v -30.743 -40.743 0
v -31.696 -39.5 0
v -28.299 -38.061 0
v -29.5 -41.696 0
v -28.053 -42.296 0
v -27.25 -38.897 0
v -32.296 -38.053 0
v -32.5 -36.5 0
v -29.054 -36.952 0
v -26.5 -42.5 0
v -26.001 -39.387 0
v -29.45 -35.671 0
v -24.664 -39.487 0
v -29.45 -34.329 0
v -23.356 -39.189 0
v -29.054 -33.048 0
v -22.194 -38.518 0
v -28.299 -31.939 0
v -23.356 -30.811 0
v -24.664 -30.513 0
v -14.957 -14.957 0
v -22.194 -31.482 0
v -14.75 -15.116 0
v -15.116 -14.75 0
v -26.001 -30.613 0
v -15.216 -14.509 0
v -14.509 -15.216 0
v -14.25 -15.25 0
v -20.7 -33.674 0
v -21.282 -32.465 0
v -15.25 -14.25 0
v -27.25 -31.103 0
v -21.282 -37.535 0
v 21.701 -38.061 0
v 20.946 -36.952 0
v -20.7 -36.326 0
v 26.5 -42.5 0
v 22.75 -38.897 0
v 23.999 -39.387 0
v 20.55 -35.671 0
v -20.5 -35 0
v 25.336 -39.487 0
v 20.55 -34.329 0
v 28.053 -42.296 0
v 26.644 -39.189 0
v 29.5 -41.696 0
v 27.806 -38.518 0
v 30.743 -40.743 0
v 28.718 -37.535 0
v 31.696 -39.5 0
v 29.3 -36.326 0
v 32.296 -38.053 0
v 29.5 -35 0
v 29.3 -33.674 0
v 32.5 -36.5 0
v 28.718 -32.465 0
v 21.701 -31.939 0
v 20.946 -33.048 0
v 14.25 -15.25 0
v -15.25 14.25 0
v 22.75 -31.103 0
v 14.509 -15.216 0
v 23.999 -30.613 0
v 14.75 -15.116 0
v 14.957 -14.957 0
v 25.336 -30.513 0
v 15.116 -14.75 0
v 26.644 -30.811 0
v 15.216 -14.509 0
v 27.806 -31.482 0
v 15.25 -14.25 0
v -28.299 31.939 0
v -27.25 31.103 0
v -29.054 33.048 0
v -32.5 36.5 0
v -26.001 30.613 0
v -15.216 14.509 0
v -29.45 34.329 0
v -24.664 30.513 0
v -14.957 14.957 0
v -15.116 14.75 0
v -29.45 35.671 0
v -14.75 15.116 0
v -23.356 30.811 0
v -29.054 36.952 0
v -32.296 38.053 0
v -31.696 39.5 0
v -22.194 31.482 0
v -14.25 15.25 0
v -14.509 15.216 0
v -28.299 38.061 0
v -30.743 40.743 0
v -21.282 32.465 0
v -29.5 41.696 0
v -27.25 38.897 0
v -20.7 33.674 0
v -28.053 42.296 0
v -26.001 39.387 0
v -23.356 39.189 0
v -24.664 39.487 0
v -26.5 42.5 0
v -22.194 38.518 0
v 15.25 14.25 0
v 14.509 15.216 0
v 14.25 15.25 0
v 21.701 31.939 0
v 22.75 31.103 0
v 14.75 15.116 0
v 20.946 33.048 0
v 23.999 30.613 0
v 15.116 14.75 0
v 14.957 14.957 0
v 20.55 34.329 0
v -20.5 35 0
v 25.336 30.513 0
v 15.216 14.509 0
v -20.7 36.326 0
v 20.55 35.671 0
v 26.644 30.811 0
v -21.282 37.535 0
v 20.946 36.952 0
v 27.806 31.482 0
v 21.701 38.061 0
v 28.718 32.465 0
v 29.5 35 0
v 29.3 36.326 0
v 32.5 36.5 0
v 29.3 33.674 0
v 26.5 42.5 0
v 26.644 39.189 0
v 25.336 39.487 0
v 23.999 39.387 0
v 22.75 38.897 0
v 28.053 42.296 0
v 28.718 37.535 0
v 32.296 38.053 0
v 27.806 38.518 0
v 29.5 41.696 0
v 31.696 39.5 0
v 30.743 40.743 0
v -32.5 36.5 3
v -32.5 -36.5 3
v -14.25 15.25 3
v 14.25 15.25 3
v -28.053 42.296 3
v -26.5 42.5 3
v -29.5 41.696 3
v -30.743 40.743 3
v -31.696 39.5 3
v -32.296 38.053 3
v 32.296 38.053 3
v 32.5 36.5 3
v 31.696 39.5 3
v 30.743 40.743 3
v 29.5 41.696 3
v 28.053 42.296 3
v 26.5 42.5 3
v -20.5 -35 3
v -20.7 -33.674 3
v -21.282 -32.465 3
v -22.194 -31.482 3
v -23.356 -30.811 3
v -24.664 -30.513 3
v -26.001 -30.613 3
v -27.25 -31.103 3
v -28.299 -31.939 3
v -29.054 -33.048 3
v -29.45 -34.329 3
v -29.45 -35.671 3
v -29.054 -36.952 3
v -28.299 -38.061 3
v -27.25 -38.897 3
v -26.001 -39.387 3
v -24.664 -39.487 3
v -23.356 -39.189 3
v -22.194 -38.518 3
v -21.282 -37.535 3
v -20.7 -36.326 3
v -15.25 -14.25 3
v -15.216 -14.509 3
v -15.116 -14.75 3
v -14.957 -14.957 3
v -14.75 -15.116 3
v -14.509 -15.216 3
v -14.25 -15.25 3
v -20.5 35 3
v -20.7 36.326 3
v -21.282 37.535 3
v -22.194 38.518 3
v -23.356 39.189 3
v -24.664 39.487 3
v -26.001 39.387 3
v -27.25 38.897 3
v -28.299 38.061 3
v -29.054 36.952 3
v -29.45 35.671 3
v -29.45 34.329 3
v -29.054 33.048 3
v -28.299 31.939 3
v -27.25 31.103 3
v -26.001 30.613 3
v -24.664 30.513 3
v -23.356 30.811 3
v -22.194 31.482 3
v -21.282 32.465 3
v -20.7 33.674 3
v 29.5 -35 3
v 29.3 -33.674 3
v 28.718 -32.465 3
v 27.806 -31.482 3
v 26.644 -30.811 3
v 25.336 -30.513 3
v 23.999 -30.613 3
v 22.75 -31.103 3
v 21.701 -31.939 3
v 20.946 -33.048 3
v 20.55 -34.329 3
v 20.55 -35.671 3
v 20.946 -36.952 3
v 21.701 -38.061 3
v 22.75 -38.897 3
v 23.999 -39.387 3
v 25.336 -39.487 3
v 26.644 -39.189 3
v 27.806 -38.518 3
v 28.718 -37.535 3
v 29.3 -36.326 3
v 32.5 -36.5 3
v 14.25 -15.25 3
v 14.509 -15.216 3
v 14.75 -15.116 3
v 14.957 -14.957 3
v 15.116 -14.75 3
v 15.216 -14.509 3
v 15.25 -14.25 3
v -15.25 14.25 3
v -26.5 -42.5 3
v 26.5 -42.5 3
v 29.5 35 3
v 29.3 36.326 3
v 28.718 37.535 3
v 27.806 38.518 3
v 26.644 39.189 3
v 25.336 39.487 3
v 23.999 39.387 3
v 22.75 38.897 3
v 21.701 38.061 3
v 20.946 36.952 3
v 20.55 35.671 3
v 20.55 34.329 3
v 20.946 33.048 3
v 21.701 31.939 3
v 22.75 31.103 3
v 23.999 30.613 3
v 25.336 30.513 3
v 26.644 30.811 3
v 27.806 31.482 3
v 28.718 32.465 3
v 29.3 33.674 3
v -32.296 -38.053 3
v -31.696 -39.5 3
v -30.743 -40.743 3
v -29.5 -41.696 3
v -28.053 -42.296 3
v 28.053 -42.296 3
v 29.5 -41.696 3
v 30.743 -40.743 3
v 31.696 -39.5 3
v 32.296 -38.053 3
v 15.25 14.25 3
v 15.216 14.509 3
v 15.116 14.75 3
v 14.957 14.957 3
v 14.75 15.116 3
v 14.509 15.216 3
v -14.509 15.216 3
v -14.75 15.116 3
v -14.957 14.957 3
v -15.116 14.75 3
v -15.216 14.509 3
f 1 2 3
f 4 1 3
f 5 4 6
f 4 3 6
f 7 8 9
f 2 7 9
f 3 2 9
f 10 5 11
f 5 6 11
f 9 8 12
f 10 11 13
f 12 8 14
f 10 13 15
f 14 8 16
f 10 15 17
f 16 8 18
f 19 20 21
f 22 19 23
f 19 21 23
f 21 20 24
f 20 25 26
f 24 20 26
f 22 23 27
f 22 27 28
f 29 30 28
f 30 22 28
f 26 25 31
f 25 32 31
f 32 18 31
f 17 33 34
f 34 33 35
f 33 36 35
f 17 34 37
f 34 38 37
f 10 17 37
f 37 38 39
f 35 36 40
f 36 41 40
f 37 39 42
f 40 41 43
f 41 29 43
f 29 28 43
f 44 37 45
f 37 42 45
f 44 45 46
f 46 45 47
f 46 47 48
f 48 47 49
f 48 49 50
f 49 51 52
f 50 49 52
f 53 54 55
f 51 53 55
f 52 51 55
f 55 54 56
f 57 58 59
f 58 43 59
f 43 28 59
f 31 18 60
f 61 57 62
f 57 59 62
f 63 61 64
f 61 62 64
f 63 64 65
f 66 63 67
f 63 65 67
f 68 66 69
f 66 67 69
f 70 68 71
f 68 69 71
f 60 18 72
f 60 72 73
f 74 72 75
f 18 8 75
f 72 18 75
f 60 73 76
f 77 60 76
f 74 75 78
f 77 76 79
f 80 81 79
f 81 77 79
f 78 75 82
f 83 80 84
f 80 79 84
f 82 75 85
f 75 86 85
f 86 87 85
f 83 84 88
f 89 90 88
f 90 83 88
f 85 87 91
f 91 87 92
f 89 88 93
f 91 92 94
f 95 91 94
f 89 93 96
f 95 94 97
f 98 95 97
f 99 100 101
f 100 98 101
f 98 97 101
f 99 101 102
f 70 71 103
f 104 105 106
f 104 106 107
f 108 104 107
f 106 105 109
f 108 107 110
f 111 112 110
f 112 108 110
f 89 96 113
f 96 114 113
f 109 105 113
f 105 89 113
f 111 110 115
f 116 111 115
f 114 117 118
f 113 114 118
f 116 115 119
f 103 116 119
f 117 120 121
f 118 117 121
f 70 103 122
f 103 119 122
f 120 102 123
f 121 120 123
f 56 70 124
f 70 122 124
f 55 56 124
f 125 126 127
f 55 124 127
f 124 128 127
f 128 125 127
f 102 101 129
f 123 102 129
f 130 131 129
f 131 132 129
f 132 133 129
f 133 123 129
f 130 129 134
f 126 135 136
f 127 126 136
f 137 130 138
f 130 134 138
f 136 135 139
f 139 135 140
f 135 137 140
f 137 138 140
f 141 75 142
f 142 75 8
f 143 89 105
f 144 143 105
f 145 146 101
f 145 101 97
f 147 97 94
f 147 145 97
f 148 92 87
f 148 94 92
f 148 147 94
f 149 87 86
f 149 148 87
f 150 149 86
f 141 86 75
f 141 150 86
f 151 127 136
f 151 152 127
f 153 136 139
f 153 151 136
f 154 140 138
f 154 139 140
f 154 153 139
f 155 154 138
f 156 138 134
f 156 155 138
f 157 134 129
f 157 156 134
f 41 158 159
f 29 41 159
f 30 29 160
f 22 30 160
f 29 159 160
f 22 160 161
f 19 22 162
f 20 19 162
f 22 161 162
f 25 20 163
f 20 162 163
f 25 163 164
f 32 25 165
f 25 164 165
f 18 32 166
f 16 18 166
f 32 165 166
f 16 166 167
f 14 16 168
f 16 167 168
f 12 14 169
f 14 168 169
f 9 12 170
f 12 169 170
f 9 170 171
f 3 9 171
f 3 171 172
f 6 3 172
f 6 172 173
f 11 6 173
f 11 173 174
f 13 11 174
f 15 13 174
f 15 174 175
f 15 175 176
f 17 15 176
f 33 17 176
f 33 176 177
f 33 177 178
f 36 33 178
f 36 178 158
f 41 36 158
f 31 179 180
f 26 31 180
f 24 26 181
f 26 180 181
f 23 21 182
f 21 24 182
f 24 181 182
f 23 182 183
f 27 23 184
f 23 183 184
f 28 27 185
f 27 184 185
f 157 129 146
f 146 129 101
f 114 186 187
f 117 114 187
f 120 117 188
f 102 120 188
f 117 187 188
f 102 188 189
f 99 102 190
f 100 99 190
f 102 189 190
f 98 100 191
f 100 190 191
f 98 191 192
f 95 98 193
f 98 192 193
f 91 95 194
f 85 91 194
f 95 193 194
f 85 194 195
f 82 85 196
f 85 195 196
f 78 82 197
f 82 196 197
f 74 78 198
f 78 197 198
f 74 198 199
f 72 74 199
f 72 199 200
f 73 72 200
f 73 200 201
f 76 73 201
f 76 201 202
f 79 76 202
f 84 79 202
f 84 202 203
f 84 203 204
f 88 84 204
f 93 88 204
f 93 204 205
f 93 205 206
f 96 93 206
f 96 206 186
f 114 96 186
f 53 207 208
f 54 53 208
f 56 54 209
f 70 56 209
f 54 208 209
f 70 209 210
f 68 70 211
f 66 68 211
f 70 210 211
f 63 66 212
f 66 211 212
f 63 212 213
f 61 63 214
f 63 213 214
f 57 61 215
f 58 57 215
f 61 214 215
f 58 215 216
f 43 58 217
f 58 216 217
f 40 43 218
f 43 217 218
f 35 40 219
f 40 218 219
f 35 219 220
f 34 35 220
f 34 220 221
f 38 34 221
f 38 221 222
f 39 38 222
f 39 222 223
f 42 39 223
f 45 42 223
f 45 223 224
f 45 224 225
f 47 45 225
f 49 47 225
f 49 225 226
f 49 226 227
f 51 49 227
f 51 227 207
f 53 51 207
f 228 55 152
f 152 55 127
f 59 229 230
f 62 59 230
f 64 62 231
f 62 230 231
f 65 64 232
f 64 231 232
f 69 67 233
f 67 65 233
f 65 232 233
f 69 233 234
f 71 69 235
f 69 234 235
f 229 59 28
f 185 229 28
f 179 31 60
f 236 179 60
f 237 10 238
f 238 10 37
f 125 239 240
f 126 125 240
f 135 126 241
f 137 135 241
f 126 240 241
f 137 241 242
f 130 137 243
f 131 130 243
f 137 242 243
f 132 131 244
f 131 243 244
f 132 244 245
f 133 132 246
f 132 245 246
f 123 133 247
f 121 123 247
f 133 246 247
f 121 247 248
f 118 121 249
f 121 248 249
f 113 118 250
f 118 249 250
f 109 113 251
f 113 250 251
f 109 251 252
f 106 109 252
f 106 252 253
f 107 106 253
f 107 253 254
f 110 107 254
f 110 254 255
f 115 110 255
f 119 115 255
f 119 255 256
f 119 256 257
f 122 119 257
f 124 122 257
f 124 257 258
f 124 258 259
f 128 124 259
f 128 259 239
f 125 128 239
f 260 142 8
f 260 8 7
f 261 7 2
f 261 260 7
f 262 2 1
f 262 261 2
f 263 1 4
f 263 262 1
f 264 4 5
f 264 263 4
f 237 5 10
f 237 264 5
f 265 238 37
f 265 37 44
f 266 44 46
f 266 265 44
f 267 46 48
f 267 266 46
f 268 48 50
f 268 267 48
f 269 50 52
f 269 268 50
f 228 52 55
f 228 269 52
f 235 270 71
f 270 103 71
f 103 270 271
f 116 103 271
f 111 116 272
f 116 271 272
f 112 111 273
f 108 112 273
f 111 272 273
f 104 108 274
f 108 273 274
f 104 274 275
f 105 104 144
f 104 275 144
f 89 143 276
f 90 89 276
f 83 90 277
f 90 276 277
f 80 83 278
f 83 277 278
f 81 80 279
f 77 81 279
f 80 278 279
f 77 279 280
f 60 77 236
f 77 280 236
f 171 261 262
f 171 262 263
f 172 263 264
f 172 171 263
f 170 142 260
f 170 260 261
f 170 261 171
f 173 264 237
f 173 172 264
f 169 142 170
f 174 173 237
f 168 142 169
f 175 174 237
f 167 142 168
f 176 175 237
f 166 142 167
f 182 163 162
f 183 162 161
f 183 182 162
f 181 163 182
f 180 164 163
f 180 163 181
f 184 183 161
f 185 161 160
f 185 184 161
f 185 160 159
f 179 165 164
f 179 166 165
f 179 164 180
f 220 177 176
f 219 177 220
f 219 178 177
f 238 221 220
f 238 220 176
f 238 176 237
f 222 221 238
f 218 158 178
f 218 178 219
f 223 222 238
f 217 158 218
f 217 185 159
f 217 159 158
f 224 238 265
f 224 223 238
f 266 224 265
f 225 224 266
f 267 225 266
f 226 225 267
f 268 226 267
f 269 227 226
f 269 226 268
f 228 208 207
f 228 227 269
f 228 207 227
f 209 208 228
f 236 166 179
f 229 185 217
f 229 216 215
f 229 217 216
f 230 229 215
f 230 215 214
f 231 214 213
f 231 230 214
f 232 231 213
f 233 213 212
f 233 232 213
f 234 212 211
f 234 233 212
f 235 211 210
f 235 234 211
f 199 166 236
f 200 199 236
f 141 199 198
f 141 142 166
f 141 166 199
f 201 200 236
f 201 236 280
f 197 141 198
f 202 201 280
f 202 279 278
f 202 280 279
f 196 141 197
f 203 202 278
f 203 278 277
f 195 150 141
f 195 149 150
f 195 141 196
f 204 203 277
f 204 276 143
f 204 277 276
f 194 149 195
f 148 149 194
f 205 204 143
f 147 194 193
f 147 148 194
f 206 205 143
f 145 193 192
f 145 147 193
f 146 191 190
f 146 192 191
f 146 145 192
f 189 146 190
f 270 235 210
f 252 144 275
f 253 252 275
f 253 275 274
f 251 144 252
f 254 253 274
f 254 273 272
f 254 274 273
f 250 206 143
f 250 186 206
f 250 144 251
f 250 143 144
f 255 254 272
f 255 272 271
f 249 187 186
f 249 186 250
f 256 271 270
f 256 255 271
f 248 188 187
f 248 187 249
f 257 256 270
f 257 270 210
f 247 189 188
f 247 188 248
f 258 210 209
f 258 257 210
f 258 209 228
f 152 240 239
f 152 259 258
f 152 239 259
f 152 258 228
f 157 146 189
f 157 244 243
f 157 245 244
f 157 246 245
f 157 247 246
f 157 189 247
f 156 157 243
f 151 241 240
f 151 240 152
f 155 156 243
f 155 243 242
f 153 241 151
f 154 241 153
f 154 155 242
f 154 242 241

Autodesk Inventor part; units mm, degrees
ref_plane "YZ Plane" through (0, 0, 0) normal (1, 0, 0) x (0, 1, 0)
ref_plane "XZ Plane" through (0, 0, 0) normal (0, 1, 0) x (-1, 0, 0)
ref_plane "XY Plane" through (0, 0, 0) normal (0, 0, 1) x (1, 0, 0)
sketch "Sketch1" plane through (0, 0, 0) normal (0, 0, 1) x (1, 0, 0)
  line L0 (-32.5, -42.5) -> (32.5, -42.5)
  line L1 (32.5, -42.5) -> (32.5, 42.5)
  line L2 (32.5, 42.5) -> (-32.5, 42.5)
  line L3 (-32.5, 42.5) -> (-32.5, -42.5)
  line L4 (-32.5, -42.5) -> (32.5, 42.5) construction
  line L5 (32.5, -42.5) -> (-32.5, 42.5) construction
  line L6 (15.25, -15.25) -> (-15.25, -15.25)
  line L7 (-15.25, -15.25) -> (-15.25, 15.25)
  line L8 (-15.25, 15.25) -> (15.25, 15.25)
  line L9 (15.25, 15.25) -> (15.25, -15.25)
  line L10 (15.25, -15.25) -> (-15.25, 15.25) construction
  line L11 (-15.25, -15.25) -> (15.25, 15.25) construction
  point P0 (0, 0)
  dimension "d154" = 65
  dimension "d155" = 85
  dimension "d172" = 30.5
extrude "Plate5" add sketch "Sketch1" along normal blind 3
sketch "Sketch9" plane through (0, 0, 3) normal (0, 0, 1) x (1, 0, 0)
  circle A0 centre (25, -35) radius 4.5
  line L0 (25, 35) -> (-25, 35) construction
  line L1 (-25, 35) -> (-25, -35) construction
  line L2 (-25, -35) -> (25, -35) construction
  line L3 (25, -35) -> (25, 35) construction
  line L4 (25, 35) -> (-25, -35) construction
  line L5 (-25, 35) -> (25, -35) construction
  circle A1 centre (-25, -35) radius 4.5
  circle A2 centre (25, 35) radius 4.5
  circle A3 centre (-25, 35) radius 4.5
  point P0 (0, 0)
  dimension "d173" = 70
  dimension "d174" = 9
  dimension "d175" = 50
extrude "Cut2" cut sketch "Sketch9" against normal blind 3
fillet "Corner Round1" radius 6 4 edges at (32.5, 42.5, 1.5) (-32.5, 42.5, 1.5) (-32.5, -42.5, 1.5) (32.5, -42.5, 1.5)
fillet "Corner Round2" radius 1 4 edges at (-15.25, 15.25, 1.5) (-15.25, -15.25, 1.5) (15.25, -15.25, 1.5) (15.25, 15.25, 1.5)
properties part number "APN 760 FDS 1200 FLANGE 3" material "Stainless Steel"
